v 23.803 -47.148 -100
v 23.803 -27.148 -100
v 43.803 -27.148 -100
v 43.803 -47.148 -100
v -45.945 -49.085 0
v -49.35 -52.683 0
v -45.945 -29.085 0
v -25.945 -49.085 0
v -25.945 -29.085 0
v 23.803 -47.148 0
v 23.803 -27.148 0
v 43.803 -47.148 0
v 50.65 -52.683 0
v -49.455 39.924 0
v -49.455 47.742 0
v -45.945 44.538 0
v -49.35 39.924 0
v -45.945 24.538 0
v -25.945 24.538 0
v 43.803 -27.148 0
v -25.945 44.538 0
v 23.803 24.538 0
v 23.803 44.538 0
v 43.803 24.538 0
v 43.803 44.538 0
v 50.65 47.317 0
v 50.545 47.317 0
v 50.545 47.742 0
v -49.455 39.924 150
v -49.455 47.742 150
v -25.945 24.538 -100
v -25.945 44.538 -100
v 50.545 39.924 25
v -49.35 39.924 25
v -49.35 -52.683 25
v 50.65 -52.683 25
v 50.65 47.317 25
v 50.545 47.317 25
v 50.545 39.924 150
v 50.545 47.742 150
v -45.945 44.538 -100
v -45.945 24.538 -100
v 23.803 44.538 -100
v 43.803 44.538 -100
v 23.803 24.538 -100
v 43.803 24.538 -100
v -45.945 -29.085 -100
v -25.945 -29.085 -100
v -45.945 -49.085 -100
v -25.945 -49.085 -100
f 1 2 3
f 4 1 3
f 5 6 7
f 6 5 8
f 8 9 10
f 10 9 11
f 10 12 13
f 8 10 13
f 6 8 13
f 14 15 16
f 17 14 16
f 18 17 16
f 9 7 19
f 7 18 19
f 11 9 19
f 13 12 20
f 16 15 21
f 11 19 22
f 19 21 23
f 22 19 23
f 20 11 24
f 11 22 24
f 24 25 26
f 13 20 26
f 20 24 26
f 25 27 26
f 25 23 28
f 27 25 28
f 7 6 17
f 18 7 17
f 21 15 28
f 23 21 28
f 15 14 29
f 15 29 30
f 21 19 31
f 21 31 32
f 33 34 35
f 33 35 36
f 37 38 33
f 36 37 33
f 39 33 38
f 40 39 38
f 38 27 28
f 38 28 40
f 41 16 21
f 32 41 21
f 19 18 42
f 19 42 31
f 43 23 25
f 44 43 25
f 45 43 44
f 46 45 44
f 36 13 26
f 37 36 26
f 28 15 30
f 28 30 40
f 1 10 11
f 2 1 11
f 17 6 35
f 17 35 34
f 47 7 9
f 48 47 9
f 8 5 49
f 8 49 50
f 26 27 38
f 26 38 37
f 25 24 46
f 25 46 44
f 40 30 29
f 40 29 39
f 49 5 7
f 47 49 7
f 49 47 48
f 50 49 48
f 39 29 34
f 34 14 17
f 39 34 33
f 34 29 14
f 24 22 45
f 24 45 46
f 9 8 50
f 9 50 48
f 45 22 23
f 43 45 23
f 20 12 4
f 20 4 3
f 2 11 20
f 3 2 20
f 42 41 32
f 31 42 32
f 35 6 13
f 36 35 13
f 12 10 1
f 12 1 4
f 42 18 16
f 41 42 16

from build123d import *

# Parameters (mm, degrees)
F0_W     = 100
F0_H     = 100
F1_DEPTH = 25
F2_W     = 20
F2_H     = 20
F3_DEPTH = 100
F4_W     = 100
F4_H     = 7.817208
F5_DEPTH = 150


with BuildPart() as f1:
    # F0 (on Top) → F1 (new body)
    with BuildSketch(Plane.XY):
        with Locations((0.650306, -2.683234)):
            Rectangle(F0_W, F0_H)
    extrude(amount=F1_DEPTH)

    # F2 (on Top) → F3 (join)
    with BuildSketch(Plane.XY):
        with Locations((33.802878, 34.537725)):
            Rectangle(F2_W, F2_H)
        with Locations((33.802878, -37.14768)):
            Rectangle(F2_W, F2_H)
        with Locations((-35.945089, 34.537725)):
            Rectangle(F2_W, F2_H)
        with Locations((-35.945089, -39.085125)):
            Rectangle(F2_W, F2_H)
    extrude(amount=-F3_DEPTH)

    # F4 (on Top) → F5 (join)
    with BuildSketch(Plane.XY):
        with Locations((0.545476, 43.83298)):
            Rectangle(F4_W, F4_H)
    extrude(amount=F5_DEPTH)


solid = f1.part
